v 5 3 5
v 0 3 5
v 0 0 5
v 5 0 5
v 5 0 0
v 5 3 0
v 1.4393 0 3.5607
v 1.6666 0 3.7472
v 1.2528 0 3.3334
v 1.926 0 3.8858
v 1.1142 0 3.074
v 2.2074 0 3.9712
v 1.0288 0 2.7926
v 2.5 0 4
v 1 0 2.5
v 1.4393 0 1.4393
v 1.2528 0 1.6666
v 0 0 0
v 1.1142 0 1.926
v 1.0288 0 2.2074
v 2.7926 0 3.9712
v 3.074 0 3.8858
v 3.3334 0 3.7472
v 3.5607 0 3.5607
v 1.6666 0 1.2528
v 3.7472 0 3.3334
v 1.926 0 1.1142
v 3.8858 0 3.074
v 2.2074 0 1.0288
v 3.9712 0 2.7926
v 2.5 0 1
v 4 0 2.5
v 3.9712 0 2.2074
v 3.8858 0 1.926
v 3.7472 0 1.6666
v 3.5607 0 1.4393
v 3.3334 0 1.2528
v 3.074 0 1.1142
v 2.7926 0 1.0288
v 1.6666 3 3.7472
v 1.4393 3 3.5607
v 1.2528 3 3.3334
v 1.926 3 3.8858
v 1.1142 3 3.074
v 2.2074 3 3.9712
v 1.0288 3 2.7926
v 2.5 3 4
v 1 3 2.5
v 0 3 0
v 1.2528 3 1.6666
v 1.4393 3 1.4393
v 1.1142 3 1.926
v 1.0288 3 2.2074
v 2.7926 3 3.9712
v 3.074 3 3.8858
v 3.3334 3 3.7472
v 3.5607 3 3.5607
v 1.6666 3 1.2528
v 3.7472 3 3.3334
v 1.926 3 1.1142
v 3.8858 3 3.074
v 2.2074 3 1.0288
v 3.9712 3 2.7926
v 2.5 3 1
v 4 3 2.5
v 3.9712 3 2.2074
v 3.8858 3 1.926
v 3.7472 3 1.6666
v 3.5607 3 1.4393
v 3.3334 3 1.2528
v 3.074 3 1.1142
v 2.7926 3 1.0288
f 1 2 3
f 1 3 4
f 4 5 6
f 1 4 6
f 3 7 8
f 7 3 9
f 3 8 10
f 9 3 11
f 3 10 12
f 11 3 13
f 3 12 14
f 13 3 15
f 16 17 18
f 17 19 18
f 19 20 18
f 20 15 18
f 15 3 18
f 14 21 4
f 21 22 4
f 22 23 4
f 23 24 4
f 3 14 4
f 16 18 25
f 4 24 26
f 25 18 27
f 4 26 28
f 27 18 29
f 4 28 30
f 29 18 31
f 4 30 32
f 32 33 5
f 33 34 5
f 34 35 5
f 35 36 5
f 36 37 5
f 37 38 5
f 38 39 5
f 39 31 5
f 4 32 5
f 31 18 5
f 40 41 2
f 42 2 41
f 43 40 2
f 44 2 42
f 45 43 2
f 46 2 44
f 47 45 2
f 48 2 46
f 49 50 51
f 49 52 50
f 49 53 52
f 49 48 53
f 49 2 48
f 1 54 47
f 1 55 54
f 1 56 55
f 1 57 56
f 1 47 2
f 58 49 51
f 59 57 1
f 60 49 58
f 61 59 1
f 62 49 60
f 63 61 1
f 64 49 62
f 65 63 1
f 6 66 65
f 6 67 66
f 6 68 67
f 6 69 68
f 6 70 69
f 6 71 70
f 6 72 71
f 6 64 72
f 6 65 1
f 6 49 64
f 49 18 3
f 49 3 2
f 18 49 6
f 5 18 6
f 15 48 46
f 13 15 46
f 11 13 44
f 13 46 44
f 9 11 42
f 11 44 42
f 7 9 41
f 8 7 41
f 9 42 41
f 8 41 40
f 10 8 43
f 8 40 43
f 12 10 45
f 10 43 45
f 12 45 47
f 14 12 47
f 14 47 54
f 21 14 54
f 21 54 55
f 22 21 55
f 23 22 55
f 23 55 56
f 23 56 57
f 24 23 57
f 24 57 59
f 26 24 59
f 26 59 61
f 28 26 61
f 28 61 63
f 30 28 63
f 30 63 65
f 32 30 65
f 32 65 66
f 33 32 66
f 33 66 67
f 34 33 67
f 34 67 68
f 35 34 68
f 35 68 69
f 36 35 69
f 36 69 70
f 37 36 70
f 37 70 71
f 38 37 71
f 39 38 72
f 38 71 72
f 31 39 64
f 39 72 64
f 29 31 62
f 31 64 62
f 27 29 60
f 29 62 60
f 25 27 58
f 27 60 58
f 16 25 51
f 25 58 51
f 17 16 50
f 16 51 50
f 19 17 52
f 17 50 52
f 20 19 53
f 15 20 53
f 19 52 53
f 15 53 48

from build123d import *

# Parameters (mm, degrees)
SKETCH1_W           = 5
SKETCH1_H           = 3
BOSS_EXTRUDE1_DEPTH = 5
SKETCH2_R           = 1.5
CUT_EXTRUDE1_DEPTH  = 8.681145748


with BuildPart() as part:
    # Sketch1 → Boss-Extrude1 (new body)
    with BuildSketch(Plane.XY):
        with Locations((2.5, 1.5)):
            Rectangle(SKETCH1_W, SKETCH1_H)
    extrude(amount=BOSS_EXTRUDE1_DEPTH)

    # Sketch2 → Cut-Extrude1 (cut, through all)
    with BuildSketch(Plane(origin=(0, 3, 0), x_dir=(1, 0, 0), z_dir=(0, 1, 0))):
        with Locations(Location((2.5, -2.5, 0), (0, 0, 180))):
            Circle(SKETCH2_R)
    extrude(amount=-CUT_EXTRUDE1_DEPTH, mode=Mode.SUBTRACT)


solid = part.part
